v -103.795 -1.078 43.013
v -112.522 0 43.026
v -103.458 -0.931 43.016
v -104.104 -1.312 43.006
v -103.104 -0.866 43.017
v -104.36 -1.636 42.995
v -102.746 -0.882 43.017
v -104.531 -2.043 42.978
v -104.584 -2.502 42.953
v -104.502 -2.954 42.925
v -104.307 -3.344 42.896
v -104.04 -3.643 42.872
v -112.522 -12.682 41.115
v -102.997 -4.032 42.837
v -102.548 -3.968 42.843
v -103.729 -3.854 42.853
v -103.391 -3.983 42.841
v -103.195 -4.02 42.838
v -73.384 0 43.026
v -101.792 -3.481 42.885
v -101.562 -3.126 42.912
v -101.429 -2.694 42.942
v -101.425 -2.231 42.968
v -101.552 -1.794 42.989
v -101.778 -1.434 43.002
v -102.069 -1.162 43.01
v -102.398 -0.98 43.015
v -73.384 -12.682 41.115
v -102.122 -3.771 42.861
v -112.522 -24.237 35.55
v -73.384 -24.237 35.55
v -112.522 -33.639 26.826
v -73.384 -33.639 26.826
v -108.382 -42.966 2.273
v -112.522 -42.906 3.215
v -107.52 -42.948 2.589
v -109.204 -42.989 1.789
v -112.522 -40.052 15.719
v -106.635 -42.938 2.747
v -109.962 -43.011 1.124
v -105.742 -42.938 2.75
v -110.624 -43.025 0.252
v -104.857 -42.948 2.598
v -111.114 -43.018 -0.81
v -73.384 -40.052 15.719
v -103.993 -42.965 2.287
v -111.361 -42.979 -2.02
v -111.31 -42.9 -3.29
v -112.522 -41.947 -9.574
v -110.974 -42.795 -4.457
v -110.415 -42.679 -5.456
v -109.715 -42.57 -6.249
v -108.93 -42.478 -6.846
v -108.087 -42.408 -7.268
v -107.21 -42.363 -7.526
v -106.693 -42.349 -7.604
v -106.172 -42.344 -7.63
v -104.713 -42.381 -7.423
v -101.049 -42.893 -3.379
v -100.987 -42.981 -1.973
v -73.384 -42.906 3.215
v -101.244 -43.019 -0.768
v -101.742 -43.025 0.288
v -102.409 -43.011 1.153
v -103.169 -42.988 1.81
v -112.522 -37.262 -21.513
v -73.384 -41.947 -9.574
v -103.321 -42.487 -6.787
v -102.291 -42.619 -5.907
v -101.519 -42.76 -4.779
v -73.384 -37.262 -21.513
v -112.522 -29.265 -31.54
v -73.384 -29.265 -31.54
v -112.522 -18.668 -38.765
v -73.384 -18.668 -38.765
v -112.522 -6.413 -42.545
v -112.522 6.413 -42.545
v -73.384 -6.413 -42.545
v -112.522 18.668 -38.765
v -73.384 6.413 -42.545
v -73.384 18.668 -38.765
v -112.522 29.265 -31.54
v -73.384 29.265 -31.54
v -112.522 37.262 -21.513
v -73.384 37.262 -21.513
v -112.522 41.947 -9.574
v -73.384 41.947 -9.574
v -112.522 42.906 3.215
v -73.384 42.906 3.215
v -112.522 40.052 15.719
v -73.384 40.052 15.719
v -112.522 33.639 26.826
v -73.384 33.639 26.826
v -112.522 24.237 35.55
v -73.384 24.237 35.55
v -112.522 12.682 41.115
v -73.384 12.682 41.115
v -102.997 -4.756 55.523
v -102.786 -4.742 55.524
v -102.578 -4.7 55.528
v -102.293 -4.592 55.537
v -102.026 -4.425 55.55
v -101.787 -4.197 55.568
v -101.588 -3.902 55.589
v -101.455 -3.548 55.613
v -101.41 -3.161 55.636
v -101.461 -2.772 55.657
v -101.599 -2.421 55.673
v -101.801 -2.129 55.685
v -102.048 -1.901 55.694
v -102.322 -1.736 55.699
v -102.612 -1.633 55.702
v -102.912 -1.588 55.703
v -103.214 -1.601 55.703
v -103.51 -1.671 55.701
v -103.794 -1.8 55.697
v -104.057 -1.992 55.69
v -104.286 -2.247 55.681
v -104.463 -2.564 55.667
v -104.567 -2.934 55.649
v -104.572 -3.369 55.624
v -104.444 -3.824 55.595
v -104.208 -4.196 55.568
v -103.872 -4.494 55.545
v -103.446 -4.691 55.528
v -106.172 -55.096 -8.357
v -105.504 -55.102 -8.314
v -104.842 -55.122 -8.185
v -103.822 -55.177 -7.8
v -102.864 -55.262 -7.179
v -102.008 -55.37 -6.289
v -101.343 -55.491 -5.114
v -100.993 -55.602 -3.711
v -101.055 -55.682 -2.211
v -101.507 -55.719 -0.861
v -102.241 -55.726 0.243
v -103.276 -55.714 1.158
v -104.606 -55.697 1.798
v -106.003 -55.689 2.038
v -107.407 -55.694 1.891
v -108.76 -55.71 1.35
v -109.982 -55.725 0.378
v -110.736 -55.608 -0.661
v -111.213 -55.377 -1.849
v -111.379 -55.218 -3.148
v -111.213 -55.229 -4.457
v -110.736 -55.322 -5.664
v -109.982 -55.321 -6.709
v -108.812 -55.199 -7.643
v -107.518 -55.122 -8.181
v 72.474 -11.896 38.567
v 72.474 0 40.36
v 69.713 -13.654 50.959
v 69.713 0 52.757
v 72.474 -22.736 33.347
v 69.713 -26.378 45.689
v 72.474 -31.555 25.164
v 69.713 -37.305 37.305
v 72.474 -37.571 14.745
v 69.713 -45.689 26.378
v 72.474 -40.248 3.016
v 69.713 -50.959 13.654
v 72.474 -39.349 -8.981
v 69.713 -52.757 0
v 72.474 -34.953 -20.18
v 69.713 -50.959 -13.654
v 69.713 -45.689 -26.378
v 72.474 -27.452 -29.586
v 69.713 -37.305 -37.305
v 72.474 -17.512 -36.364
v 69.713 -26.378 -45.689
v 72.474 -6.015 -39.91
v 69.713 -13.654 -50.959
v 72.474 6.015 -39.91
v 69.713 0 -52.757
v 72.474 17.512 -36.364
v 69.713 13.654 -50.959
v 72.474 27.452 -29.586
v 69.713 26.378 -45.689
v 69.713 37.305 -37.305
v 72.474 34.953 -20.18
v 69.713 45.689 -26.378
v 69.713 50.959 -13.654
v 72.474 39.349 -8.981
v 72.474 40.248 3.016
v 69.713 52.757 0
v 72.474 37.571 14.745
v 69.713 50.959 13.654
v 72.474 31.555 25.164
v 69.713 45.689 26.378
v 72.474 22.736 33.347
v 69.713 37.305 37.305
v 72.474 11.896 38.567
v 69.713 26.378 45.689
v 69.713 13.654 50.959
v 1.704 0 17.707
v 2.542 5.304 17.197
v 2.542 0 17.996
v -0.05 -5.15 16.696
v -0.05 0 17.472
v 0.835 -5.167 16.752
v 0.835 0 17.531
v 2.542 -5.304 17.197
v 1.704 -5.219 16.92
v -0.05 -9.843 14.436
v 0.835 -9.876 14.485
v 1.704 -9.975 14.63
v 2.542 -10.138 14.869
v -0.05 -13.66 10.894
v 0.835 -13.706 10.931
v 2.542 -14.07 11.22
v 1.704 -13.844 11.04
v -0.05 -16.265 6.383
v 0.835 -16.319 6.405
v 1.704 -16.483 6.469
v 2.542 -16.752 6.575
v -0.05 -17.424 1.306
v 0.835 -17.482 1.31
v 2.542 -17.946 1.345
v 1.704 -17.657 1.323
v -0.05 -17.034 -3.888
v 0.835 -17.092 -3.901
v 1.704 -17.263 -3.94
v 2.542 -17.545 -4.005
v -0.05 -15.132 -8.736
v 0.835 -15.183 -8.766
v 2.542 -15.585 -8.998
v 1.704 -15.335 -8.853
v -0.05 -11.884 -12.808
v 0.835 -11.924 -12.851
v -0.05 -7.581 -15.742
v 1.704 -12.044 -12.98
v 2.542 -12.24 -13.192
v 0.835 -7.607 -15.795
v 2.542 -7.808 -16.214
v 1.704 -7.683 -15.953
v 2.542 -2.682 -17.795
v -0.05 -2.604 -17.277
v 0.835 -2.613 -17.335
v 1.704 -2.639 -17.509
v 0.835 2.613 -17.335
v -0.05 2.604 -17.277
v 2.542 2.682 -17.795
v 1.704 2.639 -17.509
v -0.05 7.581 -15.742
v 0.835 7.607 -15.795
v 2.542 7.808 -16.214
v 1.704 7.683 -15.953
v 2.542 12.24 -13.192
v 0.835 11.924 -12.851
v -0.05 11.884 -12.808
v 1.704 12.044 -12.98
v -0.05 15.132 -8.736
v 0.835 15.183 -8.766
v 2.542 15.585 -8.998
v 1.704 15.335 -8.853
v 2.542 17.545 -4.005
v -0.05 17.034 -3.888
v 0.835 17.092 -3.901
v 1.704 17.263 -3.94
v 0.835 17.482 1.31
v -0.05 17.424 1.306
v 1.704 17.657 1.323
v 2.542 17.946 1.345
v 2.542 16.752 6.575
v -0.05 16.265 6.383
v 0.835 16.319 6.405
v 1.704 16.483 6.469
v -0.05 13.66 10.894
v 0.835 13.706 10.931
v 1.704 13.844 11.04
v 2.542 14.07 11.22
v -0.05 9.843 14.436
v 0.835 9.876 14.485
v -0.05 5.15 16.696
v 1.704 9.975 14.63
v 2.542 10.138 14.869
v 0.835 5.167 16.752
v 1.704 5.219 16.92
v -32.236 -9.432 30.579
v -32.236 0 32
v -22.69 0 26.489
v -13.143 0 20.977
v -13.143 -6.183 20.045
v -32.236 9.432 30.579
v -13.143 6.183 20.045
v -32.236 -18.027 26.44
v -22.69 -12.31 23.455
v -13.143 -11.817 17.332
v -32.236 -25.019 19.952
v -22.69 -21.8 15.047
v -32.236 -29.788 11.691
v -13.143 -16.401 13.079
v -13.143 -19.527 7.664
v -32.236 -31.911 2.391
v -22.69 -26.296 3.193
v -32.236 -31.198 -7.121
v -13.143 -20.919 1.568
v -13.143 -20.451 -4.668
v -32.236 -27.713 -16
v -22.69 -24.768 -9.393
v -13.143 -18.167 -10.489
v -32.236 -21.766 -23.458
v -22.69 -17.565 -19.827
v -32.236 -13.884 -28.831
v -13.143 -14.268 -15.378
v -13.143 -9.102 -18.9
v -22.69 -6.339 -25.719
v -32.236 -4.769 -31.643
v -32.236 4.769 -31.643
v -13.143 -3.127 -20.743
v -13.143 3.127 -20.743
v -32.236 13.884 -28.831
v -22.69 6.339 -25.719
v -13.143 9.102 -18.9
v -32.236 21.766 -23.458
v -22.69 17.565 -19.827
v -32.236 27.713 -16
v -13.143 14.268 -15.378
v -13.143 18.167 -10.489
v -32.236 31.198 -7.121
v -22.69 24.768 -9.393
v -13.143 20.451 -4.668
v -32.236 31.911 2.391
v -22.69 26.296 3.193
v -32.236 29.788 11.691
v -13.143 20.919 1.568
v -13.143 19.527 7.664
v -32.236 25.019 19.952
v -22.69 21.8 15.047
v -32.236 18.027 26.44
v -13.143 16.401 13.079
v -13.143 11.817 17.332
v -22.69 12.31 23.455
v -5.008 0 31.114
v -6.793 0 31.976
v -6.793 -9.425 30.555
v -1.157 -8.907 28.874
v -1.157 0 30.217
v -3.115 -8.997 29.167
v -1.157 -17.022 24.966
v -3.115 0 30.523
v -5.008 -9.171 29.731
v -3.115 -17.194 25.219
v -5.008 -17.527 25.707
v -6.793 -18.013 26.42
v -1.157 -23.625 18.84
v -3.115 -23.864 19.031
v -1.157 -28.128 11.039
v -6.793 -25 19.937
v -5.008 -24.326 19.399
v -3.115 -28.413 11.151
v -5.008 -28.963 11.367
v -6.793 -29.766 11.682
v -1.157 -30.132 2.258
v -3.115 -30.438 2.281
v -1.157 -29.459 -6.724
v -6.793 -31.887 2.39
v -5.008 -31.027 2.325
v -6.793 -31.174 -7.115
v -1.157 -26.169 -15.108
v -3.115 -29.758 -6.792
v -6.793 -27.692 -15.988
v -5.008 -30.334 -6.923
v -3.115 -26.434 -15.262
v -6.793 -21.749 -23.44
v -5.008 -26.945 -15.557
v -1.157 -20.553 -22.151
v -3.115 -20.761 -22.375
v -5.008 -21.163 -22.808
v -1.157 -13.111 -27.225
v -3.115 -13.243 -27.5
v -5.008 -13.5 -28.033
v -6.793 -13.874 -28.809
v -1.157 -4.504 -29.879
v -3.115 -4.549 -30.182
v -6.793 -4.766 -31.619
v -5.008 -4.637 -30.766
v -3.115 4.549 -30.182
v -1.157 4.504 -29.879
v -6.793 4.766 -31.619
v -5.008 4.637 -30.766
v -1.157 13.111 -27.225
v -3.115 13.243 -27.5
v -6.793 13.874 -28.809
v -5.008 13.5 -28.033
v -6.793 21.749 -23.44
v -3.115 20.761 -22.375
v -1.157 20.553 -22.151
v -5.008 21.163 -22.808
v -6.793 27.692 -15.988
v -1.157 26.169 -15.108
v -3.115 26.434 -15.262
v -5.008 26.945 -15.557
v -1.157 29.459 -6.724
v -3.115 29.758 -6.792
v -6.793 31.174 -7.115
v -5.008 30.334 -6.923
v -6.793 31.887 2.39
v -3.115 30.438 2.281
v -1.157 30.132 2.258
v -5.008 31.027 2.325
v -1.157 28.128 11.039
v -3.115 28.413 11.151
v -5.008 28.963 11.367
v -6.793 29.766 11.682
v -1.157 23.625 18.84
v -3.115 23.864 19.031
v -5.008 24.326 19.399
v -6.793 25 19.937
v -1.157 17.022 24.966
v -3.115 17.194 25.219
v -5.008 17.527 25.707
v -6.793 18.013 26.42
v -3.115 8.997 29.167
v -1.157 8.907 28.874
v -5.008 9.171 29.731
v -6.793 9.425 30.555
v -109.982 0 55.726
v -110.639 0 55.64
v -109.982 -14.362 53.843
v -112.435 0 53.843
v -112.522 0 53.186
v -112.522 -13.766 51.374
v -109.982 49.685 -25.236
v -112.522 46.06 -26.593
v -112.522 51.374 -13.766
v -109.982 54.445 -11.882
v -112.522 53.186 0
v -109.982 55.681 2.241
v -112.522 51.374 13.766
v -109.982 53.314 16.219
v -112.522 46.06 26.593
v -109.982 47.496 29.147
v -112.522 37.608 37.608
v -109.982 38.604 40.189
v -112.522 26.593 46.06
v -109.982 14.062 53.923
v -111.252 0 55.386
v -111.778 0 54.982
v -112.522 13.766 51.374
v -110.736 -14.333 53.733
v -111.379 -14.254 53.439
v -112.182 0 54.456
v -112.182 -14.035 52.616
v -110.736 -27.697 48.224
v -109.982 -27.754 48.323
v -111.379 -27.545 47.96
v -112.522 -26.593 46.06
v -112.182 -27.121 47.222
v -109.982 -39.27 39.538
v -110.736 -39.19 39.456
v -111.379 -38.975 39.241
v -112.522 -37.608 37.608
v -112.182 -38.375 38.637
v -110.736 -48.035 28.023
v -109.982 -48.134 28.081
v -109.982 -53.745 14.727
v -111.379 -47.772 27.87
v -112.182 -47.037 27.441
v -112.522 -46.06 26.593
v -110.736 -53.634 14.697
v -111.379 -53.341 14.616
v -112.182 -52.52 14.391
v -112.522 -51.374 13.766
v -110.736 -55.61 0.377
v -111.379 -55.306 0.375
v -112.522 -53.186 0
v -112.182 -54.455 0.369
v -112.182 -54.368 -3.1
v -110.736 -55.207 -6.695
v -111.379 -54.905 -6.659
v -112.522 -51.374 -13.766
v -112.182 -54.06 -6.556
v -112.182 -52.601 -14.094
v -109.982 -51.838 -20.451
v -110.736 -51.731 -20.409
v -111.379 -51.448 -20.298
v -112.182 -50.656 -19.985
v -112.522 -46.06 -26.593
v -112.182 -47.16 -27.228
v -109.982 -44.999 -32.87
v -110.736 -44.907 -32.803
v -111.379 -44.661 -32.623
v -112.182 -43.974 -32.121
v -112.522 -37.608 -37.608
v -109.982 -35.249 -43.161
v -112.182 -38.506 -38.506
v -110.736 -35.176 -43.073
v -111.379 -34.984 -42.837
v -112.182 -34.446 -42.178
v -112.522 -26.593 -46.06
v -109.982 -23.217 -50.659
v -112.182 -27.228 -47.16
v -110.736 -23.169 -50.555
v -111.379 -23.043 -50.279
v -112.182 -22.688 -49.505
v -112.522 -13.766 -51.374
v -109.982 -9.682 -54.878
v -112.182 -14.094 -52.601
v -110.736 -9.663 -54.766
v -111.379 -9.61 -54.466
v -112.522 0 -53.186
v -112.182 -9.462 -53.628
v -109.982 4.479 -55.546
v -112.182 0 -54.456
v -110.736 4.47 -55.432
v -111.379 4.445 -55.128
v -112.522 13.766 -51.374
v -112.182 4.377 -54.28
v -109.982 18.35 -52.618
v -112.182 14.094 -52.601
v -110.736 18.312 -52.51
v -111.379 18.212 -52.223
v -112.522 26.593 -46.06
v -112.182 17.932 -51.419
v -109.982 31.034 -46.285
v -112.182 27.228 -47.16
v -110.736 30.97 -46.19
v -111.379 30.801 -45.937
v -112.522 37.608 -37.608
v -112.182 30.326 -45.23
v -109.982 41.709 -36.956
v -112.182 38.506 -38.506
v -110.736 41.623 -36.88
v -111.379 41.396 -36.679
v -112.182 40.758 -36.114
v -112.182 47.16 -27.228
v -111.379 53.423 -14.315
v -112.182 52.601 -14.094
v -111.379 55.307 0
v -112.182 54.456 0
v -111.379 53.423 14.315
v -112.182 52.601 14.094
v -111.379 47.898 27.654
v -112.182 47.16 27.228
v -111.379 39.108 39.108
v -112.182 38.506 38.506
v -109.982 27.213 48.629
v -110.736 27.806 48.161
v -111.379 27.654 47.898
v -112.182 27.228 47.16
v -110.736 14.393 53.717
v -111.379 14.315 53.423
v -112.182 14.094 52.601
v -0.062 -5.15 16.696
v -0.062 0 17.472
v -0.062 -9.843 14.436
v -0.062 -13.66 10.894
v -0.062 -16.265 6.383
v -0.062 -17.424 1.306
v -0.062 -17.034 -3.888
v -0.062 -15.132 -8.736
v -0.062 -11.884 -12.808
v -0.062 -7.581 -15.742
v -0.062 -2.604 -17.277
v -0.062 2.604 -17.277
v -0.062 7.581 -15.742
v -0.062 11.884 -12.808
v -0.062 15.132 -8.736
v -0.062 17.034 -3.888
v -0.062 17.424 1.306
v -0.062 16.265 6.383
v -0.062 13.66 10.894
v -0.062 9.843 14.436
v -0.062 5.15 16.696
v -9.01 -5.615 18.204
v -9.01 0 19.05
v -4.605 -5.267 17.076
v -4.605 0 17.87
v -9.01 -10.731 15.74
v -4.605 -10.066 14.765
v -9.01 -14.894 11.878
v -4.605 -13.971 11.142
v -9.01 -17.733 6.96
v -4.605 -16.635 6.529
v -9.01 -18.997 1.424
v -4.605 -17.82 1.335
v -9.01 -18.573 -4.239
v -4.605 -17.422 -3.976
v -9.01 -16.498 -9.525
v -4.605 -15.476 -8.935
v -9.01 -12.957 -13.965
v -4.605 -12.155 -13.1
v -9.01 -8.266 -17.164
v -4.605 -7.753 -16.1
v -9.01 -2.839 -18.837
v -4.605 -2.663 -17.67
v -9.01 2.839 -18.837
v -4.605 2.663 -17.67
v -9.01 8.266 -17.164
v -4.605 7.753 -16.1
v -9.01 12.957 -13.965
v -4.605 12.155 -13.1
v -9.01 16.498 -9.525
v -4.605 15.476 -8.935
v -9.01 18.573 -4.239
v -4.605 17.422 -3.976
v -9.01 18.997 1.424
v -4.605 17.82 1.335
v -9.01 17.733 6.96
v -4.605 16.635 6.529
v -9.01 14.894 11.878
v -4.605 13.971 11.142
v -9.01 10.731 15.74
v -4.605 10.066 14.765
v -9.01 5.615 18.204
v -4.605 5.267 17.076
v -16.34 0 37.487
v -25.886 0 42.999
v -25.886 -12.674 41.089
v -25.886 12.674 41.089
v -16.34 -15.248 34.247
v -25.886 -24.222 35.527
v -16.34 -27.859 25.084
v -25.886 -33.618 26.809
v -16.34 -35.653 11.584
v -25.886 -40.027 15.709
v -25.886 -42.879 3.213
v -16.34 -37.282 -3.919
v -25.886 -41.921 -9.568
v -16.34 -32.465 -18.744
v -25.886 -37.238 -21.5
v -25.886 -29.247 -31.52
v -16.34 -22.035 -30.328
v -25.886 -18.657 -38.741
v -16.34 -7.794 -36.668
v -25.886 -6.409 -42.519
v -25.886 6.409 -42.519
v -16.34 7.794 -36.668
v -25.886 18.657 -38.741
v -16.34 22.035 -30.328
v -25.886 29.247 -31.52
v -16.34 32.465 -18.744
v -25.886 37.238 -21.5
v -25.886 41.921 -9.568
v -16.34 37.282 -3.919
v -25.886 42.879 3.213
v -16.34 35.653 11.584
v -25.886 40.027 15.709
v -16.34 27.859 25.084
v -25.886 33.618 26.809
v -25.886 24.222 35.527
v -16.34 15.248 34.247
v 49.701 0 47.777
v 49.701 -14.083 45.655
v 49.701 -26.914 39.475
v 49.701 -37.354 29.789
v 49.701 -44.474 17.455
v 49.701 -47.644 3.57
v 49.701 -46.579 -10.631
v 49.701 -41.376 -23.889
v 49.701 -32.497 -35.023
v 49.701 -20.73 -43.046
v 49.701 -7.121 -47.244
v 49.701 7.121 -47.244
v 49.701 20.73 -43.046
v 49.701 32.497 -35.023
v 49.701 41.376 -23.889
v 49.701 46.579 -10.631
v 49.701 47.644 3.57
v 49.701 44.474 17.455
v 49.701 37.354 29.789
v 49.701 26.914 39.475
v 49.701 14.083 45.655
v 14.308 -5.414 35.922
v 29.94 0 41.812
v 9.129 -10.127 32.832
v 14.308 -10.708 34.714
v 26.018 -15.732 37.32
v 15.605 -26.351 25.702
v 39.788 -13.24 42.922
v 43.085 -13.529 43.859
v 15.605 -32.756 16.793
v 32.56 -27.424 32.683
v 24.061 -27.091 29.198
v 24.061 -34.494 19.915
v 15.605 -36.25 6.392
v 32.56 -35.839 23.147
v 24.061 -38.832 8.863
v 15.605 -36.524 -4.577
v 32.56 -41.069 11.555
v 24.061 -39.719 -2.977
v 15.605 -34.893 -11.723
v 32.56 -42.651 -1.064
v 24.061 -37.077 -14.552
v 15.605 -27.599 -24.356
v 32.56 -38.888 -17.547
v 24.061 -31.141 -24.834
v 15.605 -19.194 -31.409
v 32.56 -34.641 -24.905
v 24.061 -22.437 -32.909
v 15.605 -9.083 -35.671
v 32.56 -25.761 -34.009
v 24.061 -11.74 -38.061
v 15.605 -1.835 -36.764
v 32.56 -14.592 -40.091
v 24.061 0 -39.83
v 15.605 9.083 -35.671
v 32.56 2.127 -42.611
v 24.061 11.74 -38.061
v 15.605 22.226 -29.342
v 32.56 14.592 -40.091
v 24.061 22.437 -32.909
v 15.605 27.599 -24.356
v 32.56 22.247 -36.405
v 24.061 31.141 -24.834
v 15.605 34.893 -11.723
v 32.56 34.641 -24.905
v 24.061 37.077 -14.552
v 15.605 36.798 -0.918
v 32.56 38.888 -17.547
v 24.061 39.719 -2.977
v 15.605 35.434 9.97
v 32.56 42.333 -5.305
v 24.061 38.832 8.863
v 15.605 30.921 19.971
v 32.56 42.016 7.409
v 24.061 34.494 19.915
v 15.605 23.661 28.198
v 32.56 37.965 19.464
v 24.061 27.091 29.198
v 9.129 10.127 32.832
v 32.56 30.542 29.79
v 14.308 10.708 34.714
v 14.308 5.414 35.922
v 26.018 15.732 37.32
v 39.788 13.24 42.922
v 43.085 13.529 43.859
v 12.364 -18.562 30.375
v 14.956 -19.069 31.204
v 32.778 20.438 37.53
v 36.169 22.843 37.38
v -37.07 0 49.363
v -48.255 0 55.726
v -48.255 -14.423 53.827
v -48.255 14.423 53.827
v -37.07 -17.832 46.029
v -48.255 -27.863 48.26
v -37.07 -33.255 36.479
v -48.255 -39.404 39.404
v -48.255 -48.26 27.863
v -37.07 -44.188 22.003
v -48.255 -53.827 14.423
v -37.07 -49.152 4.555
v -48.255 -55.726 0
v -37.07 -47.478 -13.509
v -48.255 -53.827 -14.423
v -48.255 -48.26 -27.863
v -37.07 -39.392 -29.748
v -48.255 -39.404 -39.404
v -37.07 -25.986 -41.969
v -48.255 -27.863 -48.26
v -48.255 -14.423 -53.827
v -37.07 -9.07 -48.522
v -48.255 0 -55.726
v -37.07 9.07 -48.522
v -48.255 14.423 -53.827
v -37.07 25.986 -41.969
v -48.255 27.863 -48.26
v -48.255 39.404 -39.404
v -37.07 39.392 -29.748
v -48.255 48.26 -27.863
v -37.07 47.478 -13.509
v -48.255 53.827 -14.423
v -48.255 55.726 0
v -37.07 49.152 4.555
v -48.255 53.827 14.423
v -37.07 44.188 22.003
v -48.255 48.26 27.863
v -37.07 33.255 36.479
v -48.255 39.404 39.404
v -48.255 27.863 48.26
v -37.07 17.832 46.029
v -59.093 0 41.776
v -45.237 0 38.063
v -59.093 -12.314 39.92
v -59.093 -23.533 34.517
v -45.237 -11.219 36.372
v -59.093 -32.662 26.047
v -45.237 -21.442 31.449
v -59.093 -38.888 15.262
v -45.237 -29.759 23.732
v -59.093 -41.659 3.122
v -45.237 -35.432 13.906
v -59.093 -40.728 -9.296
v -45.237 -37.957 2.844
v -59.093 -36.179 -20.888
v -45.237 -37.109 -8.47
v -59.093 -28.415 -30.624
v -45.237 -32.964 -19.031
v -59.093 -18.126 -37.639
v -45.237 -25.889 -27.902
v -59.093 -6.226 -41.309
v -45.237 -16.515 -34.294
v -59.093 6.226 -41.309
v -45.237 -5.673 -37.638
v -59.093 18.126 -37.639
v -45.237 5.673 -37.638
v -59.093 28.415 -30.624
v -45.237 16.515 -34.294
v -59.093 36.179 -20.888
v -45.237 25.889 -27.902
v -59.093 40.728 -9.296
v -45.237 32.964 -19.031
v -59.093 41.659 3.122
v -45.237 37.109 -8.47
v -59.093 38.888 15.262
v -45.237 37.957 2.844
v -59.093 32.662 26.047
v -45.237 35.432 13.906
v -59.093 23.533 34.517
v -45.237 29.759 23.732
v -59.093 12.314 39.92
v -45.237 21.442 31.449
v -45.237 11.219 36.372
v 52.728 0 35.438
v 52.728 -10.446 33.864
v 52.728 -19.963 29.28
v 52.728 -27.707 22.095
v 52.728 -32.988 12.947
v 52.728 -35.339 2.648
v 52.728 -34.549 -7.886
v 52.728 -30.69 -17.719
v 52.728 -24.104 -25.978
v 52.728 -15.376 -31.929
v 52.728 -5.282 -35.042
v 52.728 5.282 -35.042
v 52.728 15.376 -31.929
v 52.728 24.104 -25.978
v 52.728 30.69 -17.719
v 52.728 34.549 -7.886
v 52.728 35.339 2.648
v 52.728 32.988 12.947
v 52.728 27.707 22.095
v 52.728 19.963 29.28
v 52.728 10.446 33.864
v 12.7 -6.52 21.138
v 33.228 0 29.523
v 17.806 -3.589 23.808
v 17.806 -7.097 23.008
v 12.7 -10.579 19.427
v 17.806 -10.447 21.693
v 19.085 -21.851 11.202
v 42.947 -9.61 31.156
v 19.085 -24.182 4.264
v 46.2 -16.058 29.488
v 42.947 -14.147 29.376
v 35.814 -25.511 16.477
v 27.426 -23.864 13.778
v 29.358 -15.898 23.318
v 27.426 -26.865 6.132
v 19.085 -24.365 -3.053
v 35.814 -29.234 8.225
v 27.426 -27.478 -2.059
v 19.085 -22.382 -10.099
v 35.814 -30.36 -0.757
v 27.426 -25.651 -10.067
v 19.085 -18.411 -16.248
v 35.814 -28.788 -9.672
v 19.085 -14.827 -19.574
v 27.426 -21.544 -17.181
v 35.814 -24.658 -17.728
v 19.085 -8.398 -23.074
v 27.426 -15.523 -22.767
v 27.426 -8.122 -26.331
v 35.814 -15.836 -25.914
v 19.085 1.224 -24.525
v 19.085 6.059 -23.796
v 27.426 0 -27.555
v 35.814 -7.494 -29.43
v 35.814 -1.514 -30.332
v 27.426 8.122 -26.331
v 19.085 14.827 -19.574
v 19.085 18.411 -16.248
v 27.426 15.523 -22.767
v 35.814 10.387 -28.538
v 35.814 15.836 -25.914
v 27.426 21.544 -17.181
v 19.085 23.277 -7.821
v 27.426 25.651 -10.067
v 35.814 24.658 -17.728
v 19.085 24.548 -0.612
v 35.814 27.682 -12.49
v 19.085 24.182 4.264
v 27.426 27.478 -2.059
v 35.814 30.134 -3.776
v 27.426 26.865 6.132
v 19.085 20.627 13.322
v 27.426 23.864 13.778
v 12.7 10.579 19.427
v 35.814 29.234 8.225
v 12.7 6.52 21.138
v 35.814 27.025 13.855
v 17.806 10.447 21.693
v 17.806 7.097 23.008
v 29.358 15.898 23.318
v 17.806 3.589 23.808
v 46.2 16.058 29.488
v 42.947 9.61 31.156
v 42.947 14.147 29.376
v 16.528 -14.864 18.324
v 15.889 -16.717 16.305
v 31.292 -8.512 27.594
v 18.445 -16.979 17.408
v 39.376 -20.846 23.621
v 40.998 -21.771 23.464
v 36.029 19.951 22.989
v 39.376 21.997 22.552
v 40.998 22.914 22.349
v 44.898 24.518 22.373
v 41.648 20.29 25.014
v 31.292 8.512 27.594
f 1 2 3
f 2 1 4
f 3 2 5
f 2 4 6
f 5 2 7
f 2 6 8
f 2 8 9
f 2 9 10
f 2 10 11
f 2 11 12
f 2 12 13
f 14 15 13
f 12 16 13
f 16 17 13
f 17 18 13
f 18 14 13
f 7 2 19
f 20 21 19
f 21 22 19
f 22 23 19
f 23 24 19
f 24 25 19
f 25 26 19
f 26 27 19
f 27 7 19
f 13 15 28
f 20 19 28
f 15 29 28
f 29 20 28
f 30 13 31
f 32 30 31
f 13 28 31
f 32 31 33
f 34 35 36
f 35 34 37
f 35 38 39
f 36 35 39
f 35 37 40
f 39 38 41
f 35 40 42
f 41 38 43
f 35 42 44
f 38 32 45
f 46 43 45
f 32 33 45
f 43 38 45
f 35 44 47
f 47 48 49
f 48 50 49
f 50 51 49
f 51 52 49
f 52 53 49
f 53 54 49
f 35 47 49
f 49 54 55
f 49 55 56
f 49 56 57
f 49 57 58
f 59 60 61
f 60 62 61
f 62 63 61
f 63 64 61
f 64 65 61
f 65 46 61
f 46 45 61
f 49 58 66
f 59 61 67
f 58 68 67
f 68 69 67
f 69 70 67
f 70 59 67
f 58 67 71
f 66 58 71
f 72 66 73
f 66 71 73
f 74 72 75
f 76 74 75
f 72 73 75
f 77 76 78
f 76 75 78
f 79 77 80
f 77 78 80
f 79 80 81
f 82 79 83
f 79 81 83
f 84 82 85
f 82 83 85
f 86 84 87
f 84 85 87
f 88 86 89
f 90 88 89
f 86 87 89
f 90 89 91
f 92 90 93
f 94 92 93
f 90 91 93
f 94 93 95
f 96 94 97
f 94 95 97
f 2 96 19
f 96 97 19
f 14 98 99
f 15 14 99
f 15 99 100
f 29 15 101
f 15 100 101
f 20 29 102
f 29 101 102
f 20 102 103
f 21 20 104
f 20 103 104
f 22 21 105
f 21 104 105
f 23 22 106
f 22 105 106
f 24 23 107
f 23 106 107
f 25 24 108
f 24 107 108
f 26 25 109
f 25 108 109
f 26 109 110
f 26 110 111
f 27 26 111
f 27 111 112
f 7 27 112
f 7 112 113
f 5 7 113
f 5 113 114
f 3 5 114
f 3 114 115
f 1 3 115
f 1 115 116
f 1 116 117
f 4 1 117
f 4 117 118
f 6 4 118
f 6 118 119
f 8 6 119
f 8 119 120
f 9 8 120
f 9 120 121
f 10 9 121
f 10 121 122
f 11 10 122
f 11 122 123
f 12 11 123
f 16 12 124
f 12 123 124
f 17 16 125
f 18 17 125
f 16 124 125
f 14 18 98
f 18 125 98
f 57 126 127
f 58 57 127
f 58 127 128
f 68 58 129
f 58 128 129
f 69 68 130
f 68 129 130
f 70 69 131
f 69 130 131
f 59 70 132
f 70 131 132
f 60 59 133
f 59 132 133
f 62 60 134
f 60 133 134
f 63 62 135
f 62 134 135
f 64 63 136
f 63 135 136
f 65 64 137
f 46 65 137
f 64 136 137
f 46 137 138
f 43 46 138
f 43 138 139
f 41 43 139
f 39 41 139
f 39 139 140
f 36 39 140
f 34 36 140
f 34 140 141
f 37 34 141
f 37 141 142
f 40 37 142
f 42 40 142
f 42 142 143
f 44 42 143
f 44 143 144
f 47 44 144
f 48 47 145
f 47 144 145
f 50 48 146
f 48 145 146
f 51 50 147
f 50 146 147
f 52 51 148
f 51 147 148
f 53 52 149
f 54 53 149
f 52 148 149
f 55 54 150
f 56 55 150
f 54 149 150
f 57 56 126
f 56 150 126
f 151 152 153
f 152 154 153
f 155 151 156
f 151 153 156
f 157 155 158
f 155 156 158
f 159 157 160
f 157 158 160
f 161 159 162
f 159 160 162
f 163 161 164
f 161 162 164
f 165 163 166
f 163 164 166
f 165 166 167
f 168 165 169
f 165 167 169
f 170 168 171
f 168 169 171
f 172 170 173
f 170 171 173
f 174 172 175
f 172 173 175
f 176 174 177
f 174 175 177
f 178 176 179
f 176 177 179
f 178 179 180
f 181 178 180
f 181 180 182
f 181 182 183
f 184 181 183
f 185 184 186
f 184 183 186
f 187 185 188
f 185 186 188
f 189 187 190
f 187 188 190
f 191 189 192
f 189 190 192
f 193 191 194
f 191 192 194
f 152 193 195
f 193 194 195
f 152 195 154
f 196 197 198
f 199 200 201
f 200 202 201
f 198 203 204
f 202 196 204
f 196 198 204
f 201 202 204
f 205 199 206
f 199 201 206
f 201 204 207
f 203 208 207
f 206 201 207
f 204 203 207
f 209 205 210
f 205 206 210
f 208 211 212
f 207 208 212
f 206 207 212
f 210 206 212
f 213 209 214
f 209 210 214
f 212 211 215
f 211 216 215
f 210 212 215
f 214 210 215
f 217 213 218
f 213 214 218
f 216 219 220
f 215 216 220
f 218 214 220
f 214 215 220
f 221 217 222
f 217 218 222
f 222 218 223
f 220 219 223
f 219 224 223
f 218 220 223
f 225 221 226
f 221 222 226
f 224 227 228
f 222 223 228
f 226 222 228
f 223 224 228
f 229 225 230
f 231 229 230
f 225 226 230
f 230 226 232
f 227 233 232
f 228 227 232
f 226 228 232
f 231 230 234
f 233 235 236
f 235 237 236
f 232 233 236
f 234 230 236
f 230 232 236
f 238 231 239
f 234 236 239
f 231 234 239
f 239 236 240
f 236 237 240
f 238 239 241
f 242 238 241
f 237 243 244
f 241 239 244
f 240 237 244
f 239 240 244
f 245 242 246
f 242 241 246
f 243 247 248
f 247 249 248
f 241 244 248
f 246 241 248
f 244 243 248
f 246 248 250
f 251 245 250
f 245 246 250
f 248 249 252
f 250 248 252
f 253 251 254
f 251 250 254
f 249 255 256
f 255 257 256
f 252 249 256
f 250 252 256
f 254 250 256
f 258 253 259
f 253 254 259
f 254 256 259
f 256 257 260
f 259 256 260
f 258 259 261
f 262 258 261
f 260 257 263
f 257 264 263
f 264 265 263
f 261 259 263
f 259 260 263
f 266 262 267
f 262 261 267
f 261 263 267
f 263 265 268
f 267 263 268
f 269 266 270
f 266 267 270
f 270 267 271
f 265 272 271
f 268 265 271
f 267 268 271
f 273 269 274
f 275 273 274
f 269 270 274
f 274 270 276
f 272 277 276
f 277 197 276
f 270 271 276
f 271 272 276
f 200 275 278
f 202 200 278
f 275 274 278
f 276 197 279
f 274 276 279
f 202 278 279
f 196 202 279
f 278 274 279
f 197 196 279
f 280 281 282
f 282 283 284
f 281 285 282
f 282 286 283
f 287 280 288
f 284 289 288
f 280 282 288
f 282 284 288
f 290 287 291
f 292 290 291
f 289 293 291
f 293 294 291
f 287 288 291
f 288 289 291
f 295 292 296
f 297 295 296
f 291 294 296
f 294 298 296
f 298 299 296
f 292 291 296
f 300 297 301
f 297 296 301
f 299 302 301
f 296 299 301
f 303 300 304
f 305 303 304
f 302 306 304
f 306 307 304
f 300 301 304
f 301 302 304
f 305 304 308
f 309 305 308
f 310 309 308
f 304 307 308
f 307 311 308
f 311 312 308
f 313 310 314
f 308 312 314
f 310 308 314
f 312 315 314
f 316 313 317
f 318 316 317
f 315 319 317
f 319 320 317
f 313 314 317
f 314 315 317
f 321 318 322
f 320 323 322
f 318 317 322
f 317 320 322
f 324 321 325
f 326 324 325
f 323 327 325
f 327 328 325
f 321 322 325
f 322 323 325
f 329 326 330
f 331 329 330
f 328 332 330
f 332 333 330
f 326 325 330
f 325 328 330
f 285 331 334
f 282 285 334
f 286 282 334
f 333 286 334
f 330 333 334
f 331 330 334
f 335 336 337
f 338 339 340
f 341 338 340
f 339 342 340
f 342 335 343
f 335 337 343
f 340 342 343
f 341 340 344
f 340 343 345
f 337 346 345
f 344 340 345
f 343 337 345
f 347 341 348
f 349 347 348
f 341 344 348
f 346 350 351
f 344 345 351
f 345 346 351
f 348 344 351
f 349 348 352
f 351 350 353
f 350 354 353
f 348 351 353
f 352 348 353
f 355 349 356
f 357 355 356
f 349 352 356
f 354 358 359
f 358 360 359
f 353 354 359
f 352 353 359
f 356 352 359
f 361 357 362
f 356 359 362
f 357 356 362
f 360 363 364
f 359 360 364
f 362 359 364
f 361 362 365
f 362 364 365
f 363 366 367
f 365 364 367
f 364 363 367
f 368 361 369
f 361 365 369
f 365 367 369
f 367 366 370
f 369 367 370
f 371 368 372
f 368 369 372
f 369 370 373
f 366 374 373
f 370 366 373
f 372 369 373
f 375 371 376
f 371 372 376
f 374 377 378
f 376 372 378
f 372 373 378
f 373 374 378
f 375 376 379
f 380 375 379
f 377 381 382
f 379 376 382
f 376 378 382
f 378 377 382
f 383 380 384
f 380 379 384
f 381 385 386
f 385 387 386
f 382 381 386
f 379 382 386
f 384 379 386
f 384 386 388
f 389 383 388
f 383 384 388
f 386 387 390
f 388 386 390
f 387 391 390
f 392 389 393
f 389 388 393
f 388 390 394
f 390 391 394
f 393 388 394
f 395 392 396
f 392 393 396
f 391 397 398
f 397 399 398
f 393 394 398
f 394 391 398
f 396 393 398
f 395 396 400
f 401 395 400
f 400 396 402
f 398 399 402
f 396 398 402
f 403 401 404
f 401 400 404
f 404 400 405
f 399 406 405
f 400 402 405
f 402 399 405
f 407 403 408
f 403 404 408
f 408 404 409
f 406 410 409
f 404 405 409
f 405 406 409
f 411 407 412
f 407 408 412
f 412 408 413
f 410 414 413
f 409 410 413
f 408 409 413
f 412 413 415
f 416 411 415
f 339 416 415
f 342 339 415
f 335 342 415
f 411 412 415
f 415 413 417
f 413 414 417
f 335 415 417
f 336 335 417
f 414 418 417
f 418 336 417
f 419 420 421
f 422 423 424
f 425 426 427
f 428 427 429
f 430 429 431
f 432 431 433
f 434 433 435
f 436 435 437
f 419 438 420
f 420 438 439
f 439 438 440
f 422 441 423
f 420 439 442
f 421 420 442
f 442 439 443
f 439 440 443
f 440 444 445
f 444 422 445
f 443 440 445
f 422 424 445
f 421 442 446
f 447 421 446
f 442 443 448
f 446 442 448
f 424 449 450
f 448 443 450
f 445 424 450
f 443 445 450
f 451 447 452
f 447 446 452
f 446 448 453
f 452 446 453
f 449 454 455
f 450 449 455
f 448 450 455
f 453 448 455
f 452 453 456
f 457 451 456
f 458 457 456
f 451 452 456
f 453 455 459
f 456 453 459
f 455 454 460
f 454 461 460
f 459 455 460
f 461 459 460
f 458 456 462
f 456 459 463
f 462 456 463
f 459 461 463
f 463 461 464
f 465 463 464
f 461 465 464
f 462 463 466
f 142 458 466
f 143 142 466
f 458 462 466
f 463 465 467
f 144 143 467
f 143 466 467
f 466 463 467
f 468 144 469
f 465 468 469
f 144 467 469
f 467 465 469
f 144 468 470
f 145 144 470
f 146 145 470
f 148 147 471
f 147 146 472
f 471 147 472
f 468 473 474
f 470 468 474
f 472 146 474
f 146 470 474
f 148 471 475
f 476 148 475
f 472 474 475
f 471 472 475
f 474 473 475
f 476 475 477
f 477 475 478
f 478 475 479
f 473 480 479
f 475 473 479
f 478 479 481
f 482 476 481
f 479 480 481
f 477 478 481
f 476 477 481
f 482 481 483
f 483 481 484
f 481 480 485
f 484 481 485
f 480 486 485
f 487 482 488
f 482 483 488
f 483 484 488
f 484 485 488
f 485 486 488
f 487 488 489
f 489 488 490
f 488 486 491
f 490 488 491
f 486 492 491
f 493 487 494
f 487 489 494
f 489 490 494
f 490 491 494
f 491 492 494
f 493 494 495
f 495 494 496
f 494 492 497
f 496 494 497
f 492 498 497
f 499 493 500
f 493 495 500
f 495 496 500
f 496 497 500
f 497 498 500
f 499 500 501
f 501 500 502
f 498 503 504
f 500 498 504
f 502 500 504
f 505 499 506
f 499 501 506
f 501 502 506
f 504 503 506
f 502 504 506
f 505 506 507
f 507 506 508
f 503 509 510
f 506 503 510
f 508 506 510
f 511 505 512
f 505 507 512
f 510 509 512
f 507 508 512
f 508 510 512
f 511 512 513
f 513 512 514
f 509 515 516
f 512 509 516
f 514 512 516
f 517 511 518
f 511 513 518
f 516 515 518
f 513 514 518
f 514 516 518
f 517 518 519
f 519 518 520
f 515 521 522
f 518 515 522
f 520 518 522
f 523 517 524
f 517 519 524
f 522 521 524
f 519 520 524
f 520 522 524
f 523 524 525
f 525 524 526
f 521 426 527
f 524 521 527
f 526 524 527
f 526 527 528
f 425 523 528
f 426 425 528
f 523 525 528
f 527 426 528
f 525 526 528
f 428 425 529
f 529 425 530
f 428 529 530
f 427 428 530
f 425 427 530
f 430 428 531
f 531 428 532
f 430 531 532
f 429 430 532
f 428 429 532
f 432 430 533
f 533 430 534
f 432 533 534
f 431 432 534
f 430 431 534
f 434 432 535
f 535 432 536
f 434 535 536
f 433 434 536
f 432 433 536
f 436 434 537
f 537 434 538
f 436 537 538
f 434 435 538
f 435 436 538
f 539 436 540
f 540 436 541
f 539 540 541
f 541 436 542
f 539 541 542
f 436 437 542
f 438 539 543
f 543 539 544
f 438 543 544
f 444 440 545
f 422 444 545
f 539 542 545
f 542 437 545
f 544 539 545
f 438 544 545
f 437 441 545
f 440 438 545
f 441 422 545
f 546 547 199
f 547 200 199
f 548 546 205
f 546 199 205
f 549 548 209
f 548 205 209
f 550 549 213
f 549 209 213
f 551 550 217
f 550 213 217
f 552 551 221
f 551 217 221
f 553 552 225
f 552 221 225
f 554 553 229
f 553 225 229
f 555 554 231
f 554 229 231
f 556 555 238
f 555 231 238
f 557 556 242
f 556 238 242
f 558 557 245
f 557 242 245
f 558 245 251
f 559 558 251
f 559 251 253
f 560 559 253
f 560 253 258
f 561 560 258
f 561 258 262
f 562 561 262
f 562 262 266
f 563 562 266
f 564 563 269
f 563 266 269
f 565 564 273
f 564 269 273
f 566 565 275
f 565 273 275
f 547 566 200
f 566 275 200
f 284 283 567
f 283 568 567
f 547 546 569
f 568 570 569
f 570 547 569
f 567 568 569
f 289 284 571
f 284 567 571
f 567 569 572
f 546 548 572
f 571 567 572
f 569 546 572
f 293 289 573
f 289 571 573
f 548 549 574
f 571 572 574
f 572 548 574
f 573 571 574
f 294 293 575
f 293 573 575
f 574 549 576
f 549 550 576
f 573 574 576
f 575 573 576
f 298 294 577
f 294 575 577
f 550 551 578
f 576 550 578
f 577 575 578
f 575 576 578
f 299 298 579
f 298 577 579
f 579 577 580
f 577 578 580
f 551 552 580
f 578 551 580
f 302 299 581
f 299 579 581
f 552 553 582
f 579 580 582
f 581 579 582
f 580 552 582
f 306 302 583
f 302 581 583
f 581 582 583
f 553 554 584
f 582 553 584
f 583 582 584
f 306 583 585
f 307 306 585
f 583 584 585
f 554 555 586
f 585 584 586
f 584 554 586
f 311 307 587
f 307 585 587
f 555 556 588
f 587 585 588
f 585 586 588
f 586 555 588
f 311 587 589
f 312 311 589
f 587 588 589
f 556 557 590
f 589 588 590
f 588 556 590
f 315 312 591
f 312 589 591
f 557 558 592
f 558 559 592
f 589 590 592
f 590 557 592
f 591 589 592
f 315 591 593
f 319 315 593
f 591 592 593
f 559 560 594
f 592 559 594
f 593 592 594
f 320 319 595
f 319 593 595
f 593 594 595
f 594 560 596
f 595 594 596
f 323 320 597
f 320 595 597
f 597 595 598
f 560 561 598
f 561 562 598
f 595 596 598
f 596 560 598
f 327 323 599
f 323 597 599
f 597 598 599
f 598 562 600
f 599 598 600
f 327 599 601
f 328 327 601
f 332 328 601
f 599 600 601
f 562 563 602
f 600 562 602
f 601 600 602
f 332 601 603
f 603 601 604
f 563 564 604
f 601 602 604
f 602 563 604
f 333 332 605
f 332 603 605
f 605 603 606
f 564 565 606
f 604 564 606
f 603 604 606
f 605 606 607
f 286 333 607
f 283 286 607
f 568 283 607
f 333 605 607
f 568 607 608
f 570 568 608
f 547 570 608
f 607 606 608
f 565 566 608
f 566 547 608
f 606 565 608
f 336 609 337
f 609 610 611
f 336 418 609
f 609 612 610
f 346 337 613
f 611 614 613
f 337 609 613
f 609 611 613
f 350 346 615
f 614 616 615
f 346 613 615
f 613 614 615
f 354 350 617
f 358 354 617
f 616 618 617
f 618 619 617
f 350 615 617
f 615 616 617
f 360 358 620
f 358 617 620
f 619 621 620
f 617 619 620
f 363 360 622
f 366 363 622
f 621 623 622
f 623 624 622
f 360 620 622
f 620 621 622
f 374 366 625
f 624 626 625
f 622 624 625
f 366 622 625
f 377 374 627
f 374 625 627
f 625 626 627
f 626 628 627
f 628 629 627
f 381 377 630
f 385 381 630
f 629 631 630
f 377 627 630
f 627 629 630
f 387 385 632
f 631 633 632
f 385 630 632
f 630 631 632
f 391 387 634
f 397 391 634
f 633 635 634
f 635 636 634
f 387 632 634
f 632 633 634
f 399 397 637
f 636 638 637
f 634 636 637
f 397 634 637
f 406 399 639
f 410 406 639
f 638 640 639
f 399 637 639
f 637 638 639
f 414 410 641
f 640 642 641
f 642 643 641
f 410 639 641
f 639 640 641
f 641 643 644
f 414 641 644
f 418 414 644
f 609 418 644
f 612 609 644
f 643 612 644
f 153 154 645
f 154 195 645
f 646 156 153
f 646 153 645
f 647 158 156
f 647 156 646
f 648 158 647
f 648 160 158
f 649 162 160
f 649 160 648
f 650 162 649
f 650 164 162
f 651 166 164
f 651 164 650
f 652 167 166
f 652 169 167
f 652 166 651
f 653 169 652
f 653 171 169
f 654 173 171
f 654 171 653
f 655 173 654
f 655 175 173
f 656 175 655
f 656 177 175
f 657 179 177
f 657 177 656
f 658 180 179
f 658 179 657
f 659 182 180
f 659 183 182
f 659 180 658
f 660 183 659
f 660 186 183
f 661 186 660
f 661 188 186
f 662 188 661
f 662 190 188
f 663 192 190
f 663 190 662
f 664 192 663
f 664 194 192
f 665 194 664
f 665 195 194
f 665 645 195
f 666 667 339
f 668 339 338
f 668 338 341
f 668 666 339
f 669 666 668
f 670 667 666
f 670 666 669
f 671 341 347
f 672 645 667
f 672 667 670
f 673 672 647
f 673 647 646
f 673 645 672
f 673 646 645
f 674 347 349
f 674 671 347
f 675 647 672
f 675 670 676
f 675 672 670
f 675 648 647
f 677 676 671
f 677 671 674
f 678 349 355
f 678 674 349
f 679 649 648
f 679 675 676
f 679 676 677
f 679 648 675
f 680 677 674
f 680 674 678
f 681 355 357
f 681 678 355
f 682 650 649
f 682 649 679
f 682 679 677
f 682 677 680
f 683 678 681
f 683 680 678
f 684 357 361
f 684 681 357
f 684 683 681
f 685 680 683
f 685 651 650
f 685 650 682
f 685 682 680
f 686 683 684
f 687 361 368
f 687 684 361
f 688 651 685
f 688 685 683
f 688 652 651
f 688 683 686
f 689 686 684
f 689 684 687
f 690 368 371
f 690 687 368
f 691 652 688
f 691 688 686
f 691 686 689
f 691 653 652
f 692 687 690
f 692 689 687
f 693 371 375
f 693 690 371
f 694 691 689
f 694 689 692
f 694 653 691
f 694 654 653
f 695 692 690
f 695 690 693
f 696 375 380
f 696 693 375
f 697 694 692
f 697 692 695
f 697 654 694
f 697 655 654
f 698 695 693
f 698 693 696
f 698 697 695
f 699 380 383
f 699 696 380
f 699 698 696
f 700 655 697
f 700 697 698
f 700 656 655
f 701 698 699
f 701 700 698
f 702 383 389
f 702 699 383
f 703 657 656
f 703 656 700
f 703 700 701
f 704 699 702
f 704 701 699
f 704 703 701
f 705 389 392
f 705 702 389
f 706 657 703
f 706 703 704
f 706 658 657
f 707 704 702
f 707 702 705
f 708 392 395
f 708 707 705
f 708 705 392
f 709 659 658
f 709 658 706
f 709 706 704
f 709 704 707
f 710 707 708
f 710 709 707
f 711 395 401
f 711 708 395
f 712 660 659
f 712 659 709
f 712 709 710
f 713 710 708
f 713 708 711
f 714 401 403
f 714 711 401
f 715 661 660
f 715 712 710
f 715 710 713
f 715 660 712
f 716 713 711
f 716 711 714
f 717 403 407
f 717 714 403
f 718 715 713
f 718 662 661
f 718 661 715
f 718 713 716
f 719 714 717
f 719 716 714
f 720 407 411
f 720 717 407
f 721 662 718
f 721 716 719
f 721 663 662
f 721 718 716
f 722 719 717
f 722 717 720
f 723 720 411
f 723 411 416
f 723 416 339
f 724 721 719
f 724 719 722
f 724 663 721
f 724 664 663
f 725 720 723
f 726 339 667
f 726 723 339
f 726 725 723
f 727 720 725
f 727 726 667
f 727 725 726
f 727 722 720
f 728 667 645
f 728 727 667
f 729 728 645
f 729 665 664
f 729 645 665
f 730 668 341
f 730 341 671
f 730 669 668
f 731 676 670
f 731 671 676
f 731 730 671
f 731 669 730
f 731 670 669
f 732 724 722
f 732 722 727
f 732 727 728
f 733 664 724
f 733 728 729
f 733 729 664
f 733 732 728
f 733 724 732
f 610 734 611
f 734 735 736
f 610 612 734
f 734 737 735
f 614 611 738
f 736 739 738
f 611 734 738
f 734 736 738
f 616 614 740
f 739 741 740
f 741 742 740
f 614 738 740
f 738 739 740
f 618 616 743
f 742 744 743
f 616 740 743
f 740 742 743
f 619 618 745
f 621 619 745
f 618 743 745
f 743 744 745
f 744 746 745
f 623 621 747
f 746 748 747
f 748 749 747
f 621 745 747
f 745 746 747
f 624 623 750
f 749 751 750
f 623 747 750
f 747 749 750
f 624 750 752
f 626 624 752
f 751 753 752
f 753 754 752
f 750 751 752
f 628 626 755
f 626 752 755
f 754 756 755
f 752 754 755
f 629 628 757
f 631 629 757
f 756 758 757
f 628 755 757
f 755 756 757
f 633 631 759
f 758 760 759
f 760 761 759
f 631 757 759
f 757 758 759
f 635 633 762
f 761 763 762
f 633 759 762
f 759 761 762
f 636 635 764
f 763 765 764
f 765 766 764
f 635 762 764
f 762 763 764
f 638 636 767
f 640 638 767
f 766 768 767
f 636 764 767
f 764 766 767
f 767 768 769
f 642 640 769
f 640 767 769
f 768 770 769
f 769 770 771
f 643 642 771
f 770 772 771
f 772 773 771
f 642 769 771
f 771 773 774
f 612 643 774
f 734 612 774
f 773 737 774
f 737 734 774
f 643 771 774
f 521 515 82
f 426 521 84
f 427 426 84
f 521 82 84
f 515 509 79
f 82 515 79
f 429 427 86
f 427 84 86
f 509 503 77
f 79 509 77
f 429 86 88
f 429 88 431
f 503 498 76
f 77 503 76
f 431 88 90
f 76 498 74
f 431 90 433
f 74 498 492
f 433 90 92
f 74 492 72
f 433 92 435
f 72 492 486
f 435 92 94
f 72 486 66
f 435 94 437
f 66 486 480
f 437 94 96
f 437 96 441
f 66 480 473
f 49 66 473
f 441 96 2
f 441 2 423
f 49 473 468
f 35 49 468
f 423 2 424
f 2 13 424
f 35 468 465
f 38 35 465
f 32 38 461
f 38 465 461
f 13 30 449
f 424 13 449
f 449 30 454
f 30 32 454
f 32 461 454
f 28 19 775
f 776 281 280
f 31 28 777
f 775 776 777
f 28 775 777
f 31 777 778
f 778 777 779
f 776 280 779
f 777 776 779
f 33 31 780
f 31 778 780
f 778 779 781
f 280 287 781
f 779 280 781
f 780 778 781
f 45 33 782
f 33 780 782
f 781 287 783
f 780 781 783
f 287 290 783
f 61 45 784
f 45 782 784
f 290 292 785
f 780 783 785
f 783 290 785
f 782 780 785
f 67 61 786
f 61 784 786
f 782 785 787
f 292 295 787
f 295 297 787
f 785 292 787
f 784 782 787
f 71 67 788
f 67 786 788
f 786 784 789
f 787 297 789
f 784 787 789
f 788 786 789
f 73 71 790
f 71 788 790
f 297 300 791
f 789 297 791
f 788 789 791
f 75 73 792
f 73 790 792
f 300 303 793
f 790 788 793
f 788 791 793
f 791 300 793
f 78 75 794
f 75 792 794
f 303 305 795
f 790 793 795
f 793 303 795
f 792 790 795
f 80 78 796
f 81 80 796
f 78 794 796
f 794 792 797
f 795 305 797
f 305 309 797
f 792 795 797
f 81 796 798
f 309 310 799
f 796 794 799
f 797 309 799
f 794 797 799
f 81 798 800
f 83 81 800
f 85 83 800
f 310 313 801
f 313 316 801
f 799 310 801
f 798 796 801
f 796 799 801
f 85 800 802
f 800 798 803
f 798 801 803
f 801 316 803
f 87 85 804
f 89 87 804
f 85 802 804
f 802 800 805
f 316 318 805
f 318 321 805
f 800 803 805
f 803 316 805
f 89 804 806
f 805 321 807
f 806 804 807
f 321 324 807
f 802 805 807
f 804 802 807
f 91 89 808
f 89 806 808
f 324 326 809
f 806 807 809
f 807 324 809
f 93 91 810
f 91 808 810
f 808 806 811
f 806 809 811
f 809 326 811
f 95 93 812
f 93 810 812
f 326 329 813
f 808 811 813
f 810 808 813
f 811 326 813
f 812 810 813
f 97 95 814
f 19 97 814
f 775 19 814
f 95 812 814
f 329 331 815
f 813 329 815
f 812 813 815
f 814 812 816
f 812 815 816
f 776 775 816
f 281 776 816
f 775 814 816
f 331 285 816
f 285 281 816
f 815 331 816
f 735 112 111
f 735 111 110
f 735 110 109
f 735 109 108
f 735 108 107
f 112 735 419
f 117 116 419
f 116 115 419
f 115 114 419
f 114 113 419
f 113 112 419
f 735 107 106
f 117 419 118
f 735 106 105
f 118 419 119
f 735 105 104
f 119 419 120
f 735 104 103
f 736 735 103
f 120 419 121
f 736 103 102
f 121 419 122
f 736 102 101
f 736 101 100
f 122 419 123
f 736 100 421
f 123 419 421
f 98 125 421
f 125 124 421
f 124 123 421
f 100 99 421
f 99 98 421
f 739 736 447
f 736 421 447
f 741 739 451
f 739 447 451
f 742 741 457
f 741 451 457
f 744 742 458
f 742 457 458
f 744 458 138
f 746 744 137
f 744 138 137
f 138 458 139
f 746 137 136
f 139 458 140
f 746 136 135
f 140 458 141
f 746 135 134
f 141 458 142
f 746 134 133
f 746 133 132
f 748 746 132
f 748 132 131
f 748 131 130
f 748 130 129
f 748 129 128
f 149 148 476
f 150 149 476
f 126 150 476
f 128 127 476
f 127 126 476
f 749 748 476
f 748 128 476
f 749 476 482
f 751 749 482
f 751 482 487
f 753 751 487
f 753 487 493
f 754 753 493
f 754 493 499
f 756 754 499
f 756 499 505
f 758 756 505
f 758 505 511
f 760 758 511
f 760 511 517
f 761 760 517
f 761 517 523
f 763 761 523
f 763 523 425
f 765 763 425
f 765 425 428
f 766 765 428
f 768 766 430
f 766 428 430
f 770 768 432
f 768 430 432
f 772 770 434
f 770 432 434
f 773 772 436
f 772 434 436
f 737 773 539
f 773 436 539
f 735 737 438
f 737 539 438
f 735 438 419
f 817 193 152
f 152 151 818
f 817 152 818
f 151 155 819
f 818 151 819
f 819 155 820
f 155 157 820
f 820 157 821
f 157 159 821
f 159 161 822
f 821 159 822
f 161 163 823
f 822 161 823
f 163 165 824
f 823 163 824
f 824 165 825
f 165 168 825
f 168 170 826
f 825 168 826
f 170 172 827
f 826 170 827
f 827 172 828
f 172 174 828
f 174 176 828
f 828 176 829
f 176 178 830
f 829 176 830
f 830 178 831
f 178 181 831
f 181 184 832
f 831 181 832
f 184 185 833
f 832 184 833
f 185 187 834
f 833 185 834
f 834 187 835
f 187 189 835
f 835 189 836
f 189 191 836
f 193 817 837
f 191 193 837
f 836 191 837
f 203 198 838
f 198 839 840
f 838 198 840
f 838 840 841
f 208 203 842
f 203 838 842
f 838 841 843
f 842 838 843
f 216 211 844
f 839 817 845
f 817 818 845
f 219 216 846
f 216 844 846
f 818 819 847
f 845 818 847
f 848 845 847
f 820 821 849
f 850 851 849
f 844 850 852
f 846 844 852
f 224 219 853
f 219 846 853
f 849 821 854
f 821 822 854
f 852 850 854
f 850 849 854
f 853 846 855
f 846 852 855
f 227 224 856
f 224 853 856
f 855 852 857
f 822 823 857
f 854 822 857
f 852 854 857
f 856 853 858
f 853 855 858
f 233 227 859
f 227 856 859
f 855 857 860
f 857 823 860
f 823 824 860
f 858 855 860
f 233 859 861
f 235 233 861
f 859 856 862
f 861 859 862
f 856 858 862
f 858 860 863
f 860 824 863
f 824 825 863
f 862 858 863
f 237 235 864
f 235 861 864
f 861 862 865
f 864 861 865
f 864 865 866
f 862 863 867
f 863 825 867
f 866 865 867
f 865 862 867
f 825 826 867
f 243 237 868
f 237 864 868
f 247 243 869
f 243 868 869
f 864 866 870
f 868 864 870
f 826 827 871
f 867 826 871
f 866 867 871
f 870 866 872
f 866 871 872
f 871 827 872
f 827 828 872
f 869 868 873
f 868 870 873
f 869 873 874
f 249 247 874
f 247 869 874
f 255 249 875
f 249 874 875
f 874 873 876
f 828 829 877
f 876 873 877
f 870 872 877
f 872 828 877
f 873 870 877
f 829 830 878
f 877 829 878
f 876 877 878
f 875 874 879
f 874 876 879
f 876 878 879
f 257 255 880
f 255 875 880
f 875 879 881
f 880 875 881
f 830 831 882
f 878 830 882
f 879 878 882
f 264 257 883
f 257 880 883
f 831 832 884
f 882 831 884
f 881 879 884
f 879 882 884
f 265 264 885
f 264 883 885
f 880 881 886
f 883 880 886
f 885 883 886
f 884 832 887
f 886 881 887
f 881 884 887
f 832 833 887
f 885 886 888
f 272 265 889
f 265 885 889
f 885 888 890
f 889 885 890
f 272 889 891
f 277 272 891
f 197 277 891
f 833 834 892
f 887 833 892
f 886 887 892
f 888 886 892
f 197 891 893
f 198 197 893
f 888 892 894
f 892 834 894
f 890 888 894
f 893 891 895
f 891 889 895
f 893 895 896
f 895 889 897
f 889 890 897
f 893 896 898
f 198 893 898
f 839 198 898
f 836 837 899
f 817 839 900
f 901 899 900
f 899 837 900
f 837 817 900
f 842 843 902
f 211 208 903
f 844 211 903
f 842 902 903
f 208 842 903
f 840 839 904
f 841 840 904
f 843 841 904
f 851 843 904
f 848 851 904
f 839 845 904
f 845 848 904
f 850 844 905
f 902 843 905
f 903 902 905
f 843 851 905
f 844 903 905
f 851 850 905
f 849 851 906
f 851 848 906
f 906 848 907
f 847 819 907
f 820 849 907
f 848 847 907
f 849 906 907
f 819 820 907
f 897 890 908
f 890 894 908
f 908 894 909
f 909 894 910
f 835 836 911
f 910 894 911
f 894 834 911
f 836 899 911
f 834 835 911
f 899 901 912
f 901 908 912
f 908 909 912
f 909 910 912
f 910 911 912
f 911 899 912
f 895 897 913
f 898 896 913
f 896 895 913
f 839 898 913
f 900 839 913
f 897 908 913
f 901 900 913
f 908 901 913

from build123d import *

# Parameters (mm, degrees)
FILLET1_R               = 2.54
CUT_EXTRUDE1_REACH      = 170.913
CUT_EXTRUDE1_END_RADIUS = 43.0260506
SKETCH2_R               = 1.5875
CUT_EXTRUDE2_REACH      = 170.913
CUT_EXTRUDE2_END_RADIUS = 43.0260506
SKETCH3_R               = 5.207


with BuildPart() as part:
    # Model → Revolve1 (revolve)
    with BuildSketch(Plane.XY, mode=Mode.PRIVATE) as revolve1_sk:
        with BuildLine():
            Line((-112.522, 43.0260506), (-73.383883216, 43.0260506))
            ThreePointArc((-73.383883216, 43.0260506), (-52.084113896, 40.221883155), (-32.235888265, 32.000480144))
            Line((-32.235888265, 32.000480144), (-13.143390216, 20.97742306))
            ThreePointArc((-13.143390216, 20.97742306), (-6.833614784, 18.363828893), (-0.062391821, 17.4723806))
            Line((-0.062391821, 17.4723806), (-0.049911, 17.4723806))
            ThreePointArc((-0.049911, 17.4723806), (1.272148929, 17.604626372), (2.541818849, 17.996123109))
            add(Edge.make_bspline(
                [(2.541818849, 17.996123109), (36.7084102, 32.3929756), (72.4744296, 40.360473)],
                knots=[0, 0, 0, 1, 1, 1], degree=2))
            Line((72.4744296, 40.360473), (69.712974983, 52.756616287))
            add(Edge.make_bspline(
                [(-1.156547602, 30.216919323), (4.596059921, 32.619985433), (16.22720374, 37.184585521), (39.705039846, 45.226383183), (57.634347708, 50.065893836), (69.712974983, 52.756616287)],
                knots=[0.017508698, 0.017508698, 0.017508698, 0.017508698, 0.263131524, 0.508754349, 1, 1, 1, 1], degree=3))
            ThreePointArc((-1.156547602, 30.216919323), (-4.072604577, 30.78355815), (-6.793390995, 31.975946137))
            Line((-6.793390995, 31.975946137), (-25.885889044, 42.999003222))
            Line((-25.885889044, 42.999003222), (-48.255103535, 55.7260506))
            Line((-48.255103535, 55.7260506), (-112.522, 55.7260506))
            Line((-112.522, 55.7260506), (-112.522, 43.0260506))
        make_face()
    revolve(revolve1_sk.sketch.rotate(Axis((-112.522, 0, 0), (1, 0, 0)), 90), axis=Axis((-112.522, 0, 0), (1, 0, 0)))

    # Fillet1
    fillet1_edges = [part.edges().sort_by_distance(p)[0] for p in [
        (-112.522, 0, -55.7260506),
    ]]
    fillet(fillet1_edges, radius=FILLET1_R)

    # Cut-Extrude1: up to this cylinder (the profile starts outside it)
    cut_extrude1_end = Plane(origin=(-102.997, 0, 0), z_dir=(-1, 0, 0)) * Cylinder(CUT_EXTRUDE1_END_RADIUS, 428.8781012, mode=Mode.PRIVATE)
    # Sketch2 → Cut-Extrude1 (cut, up to the surface)
    with BuildSketch(Plane(origin=(0, -3.172071011, 55.635696104), x_dir=(-1, 0, 0), z_dir=(0, -0.056922587846044495, 0.9983785950193993)), mode=Mode.PRIVATE) as cut_extrude1_sk1:
        with Locations(Location((102.997, 0, 0), (0, 0, 90))):
            Circle(SKETCH2_R)
    cut_extrude1_tool1 = extrude(cut_extrude1_sk1.sketch, amount=-CUT_EXTRUDE1_REACH, mode=Mode.PRIVATE) - cut_extrude1_end
    add(cut_extrude1_tool1.solids().sort_by_distance((-102.997, -3.172071, 55.635696))[0], mode=Mode.SUBTRACT)

    # Cut-Extrude2: up to this cylinder (the profile starts outside it)
    cut_extrude2_end = Plane(origin=(-106.172, 0, 0), z_dir=(-1, 0, 0)) * Cylinder(CUT_EXTRUDE2_END_RADIUS, 428.8781012, mode=Mode.PRIVATE)
    # Sketch3 → Cut-Extrude2 (cut, up to the surface)
    with BuildSketch(Plane(origin=(0, -55.635696104, -3.172071011), x_dir=(-1, 0, 0), z_dir=(0, -0.9983785950193991, -0.05692258784604798)), mode=Mode.PRIVATE) as cut_extrude2_sk1:
        with Locations(Location((106.172, 0, 0), (0, 0, 90))):
            Circle(SKETCH3_R)
    cut_extrude2_tool1 = extrude(cut_extrude2_sk1.sketch, amount=-CUT_EXTRUDE2_REACH, mode=Mode.PRIVATE) - cut_extrude2_end
    add(cut_extrude2_tool1.solids().sort_by_distance((-106.172, -55.635696, -3.172071))[0], mode=Mode.SUBTRACT)


solid = part.part
